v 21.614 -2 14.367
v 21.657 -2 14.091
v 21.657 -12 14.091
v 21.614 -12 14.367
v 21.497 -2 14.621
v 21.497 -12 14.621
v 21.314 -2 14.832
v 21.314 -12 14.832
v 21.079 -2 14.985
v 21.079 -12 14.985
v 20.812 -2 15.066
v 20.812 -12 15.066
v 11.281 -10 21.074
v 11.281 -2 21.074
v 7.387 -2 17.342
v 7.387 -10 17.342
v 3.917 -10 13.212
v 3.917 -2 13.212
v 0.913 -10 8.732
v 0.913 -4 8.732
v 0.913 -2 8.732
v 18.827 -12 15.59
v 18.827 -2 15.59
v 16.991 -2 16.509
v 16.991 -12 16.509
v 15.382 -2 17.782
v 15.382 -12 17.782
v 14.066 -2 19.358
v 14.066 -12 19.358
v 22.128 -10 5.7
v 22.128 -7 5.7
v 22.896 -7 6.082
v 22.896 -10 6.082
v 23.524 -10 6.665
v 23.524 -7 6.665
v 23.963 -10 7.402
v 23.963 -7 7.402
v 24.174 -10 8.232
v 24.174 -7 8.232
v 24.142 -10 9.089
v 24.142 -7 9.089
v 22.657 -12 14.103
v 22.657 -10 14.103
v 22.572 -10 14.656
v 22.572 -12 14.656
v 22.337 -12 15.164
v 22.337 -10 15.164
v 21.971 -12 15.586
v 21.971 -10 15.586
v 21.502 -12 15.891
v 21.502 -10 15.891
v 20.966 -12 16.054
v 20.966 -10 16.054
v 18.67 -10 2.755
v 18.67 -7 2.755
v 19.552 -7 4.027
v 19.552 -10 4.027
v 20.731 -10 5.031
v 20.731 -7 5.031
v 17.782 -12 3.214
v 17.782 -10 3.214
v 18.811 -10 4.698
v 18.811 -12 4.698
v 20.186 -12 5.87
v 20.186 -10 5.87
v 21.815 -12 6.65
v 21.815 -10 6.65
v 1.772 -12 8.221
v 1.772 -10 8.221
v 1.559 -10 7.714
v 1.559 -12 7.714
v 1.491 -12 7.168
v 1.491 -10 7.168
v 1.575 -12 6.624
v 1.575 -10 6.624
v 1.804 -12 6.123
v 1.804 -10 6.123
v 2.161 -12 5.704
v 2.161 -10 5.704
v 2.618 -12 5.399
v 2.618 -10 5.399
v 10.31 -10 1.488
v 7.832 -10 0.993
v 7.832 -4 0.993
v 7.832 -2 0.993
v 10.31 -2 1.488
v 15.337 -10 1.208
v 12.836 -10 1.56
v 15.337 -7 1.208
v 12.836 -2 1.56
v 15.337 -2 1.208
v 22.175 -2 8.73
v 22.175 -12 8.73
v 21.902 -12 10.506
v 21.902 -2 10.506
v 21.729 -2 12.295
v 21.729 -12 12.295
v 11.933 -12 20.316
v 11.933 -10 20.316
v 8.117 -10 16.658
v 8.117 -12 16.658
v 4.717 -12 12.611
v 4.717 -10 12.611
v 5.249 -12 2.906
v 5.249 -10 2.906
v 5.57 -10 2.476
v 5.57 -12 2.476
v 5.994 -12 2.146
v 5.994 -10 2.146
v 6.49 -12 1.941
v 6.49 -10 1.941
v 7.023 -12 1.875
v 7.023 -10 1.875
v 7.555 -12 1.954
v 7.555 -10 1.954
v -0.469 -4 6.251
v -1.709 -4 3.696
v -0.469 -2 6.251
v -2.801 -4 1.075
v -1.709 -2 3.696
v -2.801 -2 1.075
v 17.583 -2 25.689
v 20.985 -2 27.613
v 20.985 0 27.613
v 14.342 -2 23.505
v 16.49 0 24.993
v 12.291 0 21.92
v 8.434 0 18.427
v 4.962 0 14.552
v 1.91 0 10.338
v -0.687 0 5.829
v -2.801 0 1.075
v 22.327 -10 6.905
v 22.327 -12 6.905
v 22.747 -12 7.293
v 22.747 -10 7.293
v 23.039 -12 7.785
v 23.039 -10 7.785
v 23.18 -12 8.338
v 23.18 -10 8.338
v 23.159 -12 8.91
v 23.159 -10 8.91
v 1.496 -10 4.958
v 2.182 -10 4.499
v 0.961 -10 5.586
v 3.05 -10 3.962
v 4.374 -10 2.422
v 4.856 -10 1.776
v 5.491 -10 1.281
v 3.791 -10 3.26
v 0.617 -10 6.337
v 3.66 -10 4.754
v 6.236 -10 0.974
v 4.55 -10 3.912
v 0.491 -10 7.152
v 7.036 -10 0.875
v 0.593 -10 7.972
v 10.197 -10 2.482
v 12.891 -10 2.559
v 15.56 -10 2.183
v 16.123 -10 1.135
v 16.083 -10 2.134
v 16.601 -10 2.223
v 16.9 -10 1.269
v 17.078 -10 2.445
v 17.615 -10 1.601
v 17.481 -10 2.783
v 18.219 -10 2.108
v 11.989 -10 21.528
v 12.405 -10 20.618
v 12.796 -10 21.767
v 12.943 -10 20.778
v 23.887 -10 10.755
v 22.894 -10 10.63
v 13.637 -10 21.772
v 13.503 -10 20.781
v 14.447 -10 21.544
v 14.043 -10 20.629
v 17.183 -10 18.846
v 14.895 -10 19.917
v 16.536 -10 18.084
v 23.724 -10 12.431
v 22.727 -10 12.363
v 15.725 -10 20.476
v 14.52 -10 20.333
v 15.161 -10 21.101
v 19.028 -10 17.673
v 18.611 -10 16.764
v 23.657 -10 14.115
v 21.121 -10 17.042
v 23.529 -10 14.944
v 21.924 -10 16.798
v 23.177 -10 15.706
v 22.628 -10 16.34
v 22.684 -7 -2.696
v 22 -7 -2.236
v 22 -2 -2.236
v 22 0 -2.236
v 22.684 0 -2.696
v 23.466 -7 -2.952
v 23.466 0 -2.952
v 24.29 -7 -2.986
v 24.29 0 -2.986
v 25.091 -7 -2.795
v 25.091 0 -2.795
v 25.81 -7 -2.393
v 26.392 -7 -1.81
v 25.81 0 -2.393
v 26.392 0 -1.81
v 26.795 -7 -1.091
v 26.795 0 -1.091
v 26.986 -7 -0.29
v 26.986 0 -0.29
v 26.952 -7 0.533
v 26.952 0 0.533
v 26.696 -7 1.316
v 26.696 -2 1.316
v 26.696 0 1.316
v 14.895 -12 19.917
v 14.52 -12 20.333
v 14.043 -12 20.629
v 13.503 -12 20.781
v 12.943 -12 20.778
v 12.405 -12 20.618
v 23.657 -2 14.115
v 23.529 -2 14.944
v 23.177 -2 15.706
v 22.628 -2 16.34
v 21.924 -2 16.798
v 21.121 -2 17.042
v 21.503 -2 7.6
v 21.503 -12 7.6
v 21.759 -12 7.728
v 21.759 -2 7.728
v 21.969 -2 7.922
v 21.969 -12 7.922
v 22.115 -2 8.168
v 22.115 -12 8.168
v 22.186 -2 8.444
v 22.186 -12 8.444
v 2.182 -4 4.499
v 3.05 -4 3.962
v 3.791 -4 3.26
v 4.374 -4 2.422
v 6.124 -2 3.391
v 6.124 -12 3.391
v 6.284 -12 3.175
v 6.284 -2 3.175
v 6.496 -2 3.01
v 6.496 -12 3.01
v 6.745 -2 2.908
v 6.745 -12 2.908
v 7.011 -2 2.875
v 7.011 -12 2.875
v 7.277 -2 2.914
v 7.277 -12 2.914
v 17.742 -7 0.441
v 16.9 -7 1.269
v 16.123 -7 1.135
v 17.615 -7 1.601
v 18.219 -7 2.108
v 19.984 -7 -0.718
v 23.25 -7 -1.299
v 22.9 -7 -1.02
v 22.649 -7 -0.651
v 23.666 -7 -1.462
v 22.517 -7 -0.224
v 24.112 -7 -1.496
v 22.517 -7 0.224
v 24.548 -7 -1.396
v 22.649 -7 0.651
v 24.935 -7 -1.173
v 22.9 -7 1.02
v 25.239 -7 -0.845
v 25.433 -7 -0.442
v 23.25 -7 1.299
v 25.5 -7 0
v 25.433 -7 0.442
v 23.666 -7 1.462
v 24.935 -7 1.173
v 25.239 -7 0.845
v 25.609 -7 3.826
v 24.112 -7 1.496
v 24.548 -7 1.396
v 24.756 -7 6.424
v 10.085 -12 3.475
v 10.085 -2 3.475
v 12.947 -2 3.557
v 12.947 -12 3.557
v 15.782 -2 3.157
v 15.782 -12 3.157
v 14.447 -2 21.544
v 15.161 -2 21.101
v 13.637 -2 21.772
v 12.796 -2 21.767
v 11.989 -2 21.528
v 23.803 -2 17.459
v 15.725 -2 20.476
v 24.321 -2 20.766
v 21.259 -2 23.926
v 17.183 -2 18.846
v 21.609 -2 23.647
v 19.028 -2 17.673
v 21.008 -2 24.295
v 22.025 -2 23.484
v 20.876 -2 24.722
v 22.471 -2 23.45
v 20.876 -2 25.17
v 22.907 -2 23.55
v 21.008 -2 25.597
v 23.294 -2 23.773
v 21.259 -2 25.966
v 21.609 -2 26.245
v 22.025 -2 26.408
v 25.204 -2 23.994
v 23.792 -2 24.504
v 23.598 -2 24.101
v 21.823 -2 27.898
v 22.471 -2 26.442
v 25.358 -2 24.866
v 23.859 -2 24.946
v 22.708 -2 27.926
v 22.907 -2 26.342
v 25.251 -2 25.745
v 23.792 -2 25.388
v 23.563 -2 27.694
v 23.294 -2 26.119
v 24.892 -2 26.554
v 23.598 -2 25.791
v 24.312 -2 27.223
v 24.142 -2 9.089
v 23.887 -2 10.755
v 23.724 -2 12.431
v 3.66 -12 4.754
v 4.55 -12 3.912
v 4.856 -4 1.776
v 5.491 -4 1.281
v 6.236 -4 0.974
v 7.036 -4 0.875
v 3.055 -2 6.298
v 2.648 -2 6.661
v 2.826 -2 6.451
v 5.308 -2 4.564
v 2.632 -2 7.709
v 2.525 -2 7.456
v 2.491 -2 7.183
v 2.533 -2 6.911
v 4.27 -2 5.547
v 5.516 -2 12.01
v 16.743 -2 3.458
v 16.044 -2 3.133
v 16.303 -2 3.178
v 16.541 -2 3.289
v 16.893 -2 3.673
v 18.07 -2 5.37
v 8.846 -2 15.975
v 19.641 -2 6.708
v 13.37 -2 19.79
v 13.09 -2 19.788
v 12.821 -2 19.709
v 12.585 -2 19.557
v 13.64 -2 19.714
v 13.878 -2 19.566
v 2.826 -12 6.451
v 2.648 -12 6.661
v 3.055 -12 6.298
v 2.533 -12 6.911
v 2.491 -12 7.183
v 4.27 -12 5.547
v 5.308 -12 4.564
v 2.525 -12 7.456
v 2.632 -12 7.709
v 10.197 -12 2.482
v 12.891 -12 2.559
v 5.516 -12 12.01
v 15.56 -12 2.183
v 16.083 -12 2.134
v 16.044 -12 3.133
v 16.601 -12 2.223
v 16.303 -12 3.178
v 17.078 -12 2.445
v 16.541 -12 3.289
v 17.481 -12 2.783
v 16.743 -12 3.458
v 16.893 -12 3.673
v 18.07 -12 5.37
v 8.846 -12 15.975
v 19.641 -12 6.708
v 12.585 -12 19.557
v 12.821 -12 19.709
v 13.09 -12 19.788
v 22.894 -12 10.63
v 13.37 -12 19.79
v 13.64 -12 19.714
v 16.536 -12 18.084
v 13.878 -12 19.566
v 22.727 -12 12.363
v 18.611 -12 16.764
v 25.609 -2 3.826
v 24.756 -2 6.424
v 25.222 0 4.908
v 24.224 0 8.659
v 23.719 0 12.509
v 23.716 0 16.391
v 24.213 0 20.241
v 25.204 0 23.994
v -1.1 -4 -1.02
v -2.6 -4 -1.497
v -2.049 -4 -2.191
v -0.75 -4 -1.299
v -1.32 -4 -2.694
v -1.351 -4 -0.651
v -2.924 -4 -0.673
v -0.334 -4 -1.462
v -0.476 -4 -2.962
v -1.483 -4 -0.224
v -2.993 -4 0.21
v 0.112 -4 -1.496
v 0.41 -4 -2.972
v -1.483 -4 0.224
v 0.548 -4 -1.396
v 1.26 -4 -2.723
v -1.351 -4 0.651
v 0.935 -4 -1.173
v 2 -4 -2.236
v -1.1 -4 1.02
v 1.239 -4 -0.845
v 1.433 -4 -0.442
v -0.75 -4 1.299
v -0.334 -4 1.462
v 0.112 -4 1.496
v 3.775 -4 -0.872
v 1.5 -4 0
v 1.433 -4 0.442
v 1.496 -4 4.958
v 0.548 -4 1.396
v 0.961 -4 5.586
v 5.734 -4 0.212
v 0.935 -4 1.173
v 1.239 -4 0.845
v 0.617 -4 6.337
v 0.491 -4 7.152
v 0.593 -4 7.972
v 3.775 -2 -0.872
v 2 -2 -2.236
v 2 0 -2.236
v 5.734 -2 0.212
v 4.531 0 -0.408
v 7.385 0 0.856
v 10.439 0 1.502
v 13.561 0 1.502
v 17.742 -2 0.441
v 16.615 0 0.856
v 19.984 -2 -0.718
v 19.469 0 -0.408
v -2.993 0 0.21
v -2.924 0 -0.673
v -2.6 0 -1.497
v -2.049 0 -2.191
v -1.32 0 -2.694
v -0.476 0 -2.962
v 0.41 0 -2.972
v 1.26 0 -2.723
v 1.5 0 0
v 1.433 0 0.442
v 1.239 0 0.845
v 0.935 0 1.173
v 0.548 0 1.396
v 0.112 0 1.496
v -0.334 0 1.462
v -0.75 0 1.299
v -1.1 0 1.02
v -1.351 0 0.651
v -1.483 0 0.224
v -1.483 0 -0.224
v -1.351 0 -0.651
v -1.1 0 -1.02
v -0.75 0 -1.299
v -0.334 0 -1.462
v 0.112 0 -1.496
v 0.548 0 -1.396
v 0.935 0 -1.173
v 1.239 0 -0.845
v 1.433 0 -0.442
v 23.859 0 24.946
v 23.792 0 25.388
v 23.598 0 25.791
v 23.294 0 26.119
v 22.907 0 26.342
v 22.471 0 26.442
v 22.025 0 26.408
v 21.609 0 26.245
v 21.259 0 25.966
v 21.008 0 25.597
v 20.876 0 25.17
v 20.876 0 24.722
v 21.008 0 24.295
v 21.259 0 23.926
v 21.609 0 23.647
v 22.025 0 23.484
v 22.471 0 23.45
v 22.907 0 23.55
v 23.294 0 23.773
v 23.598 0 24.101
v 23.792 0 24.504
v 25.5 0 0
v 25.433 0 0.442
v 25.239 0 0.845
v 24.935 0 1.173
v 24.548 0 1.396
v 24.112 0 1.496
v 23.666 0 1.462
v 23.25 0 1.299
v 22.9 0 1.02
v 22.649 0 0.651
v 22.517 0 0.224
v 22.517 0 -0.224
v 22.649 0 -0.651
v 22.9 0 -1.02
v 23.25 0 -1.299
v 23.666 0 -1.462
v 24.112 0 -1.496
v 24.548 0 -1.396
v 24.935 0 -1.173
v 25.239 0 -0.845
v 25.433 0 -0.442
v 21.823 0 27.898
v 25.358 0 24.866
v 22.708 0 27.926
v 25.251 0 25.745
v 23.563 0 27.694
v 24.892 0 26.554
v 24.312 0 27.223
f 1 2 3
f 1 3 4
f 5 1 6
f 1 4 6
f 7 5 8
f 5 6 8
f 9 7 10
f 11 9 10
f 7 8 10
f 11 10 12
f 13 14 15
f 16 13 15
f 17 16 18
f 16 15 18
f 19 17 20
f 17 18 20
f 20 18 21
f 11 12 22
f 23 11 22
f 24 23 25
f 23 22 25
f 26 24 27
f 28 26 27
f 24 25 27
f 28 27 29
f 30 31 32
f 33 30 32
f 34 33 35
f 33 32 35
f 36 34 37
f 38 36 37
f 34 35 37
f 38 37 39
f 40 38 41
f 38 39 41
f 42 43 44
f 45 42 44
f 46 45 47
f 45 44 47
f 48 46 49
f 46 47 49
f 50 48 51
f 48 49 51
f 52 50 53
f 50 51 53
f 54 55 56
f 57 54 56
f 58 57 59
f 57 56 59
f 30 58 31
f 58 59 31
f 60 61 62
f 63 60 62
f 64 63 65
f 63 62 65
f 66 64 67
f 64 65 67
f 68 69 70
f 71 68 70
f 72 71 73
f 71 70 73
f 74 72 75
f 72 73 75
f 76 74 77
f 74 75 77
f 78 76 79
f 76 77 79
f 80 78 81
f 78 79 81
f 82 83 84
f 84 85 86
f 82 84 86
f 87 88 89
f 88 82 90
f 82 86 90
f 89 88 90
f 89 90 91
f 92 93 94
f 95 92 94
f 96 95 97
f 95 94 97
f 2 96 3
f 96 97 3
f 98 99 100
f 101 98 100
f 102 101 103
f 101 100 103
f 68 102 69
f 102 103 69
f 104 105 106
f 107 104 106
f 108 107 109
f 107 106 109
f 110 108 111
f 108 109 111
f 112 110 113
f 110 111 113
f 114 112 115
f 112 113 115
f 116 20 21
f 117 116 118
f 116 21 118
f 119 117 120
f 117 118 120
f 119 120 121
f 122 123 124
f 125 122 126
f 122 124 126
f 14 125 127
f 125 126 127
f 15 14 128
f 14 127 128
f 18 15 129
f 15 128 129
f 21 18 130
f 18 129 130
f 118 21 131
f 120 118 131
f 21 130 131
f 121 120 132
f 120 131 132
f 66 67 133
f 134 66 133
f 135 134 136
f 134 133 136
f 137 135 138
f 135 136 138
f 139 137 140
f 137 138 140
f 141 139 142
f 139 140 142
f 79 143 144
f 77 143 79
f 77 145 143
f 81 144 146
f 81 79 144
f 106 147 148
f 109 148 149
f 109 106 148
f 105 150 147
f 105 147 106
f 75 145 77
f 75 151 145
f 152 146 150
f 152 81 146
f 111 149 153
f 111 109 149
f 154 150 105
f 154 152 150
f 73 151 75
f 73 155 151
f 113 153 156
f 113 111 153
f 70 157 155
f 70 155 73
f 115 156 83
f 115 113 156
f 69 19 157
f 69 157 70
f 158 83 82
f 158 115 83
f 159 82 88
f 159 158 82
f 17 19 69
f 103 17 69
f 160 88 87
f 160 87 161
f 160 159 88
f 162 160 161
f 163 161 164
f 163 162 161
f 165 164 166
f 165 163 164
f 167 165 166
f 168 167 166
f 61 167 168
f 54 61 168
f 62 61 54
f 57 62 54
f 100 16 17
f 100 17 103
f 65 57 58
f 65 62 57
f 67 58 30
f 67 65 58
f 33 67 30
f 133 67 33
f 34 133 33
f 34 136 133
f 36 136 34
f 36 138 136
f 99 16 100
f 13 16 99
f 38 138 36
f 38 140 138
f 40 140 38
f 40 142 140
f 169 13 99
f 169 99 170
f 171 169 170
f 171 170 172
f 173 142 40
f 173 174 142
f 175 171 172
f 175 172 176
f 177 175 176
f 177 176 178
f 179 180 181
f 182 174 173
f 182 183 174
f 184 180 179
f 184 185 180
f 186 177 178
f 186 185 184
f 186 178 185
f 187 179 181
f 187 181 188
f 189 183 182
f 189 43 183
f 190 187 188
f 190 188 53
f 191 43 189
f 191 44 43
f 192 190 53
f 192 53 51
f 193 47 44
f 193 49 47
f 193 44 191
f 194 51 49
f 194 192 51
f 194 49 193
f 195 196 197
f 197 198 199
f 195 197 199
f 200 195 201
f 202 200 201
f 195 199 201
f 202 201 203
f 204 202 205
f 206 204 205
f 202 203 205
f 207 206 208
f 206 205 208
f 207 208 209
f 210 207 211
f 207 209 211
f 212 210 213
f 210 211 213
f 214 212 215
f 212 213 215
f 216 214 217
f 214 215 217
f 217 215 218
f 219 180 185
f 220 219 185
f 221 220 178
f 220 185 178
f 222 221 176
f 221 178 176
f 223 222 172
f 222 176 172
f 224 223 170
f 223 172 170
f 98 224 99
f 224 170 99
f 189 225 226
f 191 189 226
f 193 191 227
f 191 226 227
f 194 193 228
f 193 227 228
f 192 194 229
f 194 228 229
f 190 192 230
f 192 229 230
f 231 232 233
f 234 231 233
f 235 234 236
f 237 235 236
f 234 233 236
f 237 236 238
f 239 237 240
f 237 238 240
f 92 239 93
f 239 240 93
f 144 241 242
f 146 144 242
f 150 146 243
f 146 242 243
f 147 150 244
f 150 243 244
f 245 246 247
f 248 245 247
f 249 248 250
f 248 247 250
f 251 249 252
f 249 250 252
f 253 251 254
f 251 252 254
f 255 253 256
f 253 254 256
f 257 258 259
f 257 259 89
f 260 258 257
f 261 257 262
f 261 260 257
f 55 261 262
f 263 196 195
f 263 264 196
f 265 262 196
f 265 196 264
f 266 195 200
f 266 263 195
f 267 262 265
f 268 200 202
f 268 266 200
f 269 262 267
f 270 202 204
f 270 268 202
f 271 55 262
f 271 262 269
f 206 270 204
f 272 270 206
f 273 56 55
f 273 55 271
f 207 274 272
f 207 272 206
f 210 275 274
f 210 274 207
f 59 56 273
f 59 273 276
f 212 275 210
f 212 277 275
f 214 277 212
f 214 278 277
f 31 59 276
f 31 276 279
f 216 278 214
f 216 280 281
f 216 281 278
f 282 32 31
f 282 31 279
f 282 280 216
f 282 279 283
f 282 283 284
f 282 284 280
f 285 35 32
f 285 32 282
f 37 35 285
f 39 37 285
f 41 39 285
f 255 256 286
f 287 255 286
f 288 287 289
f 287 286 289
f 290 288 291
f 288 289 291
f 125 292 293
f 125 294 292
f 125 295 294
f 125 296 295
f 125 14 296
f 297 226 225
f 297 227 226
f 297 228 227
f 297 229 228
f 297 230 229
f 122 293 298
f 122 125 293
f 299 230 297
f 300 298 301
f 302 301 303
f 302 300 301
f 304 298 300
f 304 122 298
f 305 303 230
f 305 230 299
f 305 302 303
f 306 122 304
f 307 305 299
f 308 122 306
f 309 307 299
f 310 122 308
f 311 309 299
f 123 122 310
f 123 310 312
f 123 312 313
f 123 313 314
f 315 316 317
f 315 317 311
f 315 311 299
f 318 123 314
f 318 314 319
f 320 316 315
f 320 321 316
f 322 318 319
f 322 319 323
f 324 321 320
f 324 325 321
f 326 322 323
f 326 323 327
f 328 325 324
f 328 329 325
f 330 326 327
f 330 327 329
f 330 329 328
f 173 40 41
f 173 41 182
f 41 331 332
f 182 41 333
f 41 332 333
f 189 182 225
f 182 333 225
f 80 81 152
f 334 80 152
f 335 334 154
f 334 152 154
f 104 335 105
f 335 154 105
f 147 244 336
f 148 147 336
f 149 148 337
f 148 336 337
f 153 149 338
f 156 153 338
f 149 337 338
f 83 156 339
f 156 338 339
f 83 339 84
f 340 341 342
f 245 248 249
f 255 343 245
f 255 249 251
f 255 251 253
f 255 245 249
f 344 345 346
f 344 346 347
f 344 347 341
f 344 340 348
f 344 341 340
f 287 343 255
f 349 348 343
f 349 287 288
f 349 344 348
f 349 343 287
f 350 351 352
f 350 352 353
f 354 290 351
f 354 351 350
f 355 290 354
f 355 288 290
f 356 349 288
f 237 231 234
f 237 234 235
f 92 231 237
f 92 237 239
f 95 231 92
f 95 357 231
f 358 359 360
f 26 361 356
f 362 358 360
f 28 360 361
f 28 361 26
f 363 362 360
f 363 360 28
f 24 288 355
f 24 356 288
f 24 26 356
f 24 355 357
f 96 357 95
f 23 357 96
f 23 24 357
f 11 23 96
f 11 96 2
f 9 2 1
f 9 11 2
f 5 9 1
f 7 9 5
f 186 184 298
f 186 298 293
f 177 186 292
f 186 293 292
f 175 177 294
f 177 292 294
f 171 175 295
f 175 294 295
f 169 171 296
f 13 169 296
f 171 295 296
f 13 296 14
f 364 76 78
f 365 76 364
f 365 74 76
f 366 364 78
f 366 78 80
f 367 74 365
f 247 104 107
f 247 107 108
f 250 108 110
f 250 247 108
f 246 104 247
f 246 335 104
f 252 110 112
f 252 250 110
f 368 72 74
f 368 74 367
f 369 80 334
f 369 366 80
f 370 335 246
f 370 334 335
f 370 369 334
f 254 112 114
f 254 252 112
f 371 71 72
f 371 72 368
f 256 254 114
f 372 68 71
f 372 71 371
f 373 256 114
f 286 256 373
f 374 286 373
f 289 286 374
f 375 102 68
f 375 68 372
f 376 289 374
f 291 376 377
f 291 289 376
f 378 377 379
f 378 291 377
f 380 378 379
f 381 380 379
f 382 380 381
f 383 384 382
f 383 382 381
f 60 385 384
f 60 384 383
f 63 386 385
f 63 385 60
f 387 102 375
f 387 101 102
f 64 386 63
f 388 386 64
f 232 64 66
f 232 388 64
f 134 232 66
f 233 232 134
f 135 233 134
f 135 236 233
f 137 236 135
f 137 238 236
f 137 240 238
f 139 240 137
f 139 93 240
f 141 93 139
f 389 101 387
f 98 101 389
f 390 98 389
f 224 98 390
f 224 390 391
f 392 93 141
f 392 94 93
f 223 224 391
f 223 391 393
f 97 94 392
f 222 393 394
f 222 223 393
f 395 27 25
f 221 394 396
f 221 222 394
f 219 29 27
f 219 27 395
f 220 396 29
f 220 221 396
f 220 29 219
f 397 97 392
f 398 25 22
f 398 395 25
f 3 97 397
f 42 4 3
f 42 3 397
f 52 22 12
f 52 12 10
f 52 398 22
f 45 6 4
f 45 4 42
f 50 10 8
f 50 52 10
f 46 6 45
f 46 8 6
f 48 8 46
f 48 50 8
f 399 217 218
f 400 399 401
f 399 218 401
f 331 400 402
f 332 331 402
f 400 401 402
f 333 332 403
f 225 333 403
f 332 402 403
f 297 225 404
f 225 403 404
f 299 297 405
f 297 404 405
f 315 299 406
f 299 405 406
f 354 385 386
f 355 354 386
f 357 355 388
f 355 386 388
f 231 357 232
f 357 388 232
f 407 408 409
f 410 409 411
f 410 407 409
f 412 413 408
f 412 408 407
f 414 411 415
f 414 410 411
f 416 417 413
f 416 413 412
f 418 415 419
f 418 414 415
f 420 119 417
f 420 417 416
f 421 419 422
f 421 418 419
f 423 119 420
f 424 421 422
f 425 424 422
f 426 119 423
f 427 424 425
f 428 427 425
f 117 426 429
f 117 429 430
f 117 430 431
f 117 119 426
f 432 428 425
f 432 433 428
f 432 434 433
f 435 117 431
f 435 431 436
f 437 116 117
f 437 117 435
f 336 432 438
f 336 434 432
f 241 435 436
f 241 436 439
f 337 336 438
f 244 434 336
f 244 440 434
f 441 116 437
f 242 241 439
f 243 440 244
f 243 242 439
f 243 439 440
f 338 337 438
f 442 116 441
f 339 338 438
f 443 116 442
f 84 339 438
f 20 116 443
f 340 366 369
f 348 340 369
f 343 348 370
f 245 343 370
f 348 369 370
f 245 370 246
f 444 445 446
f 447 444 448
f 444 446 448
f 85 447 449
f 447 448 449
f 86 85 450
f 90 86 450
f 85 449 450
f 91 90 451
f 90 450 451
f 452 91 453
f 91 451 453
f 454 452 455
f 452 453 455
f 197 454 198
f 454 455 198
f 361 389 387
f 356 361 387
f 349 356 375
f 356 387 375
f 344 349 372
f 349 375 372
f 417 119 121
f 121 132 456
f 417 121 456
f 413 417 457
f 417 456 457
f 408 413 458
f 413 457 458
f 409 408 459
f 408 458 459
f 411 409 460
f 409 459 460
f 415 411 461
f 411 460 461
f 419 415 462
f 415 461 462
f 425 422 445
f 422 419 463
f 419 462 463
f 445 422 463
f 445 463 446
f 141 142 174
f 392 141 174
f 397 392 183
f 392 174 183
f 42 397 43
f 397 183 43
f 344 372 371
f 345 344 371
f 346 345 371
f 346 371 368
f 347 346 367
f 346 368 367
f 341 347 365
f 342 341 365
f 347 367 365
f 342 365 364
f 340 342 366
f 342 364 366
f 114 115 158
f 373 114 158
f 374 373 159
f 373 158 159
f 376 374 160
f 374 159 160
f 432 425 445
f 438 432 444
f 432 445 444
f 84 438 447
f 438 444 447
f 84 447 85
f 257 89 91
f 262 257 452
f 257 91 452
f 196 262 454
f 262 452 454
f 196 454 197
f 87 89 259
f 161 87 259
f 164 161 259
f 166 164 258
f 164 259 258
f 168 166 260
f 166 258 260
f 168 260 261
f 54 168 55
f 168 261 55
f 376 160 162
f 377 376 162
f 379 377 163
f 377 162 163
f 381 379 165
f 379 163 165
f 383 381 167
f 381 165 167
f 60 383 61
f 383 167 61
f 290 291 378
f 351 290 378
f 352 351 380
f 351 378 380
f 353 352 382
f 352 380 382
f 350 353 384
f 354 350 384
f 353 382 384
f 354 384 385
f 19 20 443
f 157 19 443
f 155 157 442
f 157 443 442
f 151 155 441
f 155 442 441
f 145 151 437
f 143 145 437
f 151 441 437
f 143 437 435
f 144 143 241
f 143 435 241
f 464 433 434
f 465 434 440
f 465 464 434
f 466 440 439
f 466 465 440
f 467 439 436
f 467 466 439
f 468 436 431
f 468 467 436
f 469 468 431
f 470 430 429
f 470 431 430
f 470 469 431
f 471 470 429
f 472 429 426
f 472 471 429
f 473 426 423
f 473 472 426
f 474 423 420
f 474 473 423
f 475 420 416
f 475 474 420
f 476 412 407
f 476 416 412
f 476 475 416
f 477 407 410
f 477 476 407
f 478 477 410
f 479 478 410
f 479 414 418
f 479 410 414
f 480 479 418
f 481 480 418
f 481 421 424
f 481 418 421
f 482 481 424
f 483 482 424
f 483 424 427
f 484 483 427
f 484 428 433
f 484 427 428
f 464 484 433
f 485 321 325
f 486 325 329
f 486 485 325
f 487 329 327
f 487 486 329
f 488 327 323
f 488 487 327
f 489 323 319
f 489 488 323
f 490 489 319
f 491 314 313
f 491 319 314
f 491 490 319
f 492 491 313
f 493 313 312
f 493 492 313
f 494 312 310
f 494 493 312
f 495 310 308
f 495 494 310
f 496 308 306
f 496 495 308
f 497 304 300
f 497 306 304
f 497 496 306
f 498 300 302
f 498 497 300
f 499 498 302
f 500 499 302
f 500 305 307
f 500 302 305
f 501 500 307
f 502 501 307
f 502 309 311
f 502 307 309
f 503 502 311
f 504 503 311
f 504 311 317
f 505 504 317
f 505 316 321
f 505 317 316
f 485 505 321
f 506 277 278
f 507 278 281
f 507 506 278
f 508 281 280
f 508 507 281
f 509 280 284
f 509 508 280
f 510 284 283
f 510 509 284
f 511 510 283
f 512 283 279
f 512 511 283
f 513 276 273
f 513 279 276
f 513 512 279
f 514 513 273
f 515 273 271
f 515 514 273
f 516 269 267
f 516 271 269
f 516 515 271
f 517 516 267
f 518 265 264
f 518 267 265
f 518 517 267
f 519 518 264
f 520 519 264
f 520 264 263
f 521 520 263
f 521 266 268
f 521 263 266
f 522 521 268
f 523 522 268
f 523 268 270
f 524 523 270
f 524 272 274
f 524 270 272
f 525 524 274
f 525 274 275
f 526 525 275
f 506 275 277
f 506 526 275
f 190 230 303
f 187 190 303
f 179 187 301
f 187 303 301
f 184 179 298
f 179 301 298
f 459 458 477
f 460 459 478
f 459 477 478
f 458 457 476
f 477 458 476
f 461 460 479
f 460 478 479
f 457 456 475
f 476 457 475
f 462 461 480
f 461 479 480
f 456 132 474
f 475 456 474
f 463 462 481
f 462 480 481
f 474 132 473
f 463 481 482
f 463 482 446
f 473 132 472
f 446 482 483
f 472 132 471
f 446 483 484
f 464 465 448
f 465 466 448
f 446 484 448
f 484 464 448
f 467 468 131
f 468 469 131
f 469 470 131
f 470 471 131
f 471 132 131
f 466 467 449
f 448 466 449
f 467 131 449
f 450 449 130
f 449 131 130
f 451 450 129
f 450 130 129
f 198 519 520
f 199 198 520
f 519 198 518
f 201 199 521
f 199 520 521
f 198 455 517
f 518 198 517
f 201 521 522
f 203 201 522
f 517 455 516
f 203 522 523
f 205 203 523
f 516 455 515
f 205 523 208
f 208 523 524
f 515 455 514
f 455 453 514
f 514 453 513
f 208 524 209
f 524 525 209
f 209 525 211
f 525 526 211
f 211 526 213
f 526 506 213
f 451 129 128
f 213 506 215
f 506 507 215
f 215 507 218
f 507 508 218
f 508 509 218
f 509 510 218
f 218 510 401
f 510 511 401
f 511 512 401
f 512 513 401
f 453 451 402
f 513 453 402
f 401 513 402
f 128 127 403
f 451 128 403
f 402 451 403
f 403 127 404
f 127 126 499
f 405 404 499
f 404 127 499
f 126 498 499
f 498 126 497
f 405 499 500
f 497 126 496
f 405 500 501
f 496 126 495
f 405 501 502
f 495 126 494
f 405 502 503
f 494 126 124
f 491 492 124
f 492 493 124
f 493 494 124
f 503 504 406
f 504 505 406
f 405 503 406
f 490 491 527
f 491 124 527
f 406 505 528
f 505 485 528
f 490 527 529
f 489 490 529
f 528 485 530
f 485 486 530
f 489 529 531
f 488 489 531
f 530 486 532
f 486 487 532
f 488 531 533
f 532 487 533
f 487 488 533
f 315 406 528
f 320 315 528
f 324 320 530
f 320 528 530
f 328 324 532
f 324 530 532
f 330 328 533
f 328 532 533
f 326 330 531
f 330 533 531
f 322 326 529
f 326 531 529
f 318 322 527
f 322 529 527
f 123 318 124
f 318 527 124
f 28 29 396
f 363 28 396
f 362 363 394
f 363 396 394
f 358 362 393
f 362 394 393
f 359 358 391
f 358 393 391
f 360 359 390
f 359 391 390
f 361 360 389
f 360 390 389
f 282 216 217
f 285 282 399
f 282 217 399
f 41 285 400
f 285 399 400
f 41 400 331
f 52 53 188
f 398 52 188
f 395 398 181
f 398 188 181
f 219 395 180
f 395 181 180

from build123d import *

# Parameters (mm, degrees)
F1_DEPTH  = 2
F3_DEPTH  = 8
F5_DEPTH  = 2
F7_DEPTH  = 5
F9_DEPTH  = 2
F11_DEPTH = 10
F12_R     = 1.5
F13_DEPTH = 12.001


with BuildPart() as f1:
    # F0 (on Front) → F1 (new body)
    with BuildSketch(Plane.XZ):
        with BuildLine():
            ThreePointArc((20.9852738604, 27.6129976553), (6.6475053794, 16.5350086475), (-2.8008963523, 1.074699783))
            ThreePointArc((-2.8008963523, 1.074699783), (-1.7031308032, -2.4696852972), (2, -2.2360679775))
            ThreePointArc((2, -2.2360679775), (12, 1.583592135), (22, -2.2360679775))
            ThreePointArc((22, -2.2360679775), (25.8098712045, -2.3925647793), (26.6958733889, 1.3161560208))
            ThreePointArc((26.6958733889, 1.3161560208), (23.7193066232, 12.5085096075), (25.2040552071, 23.994337839))
            ThreePointArc((25.2040552071, 23.994337839), (24.3121710173, 27.2230865107), (20.9852738604, 27.6129976553))
        make_face()
    extrude(amount=F1_DEPTH)

    # F2 (on face) → F3 (join)
    with BuildSketch(Plane.XZ.offset(2)):
        with BuildLine():
            ThreePointArc((2.1819579837, 4.4987842088), (3.4387063042, 3.6297794635), (4.3743364575, 2.4218134851))
            ThreePointArc((4.3743364575, 2.4218134851), (5.8533522977, 1.1022435306), (7.83244861, 0.9930166694))
            ThreePointArc((7.83244861, 0.9930166694), (11.5712509604, 1.5774633583), (15.3373412263, 1.2076187193))
            ThreePointArc((15.3373412263, 1.2076187193), (17.2681996472, 1.4114232526), (18.6698729811, 2.7549493575))
            ThreePointArc((18.6698729811, 2.7549493575), (20.1092125836, 4.5674690235), (22.1275149749, 5.7003333087))
            ThreePointArc((22.1275149749, 5.7003333087), (23.7699182337, 7.0173378758), (24.1424847183, 9.0893378054))
            ThreePointArc((24.1424847183, 9.0893378054), (23.7937370176, 11.591814757), (23.6568029492, 14.1147624204))
            ThreePointArc((23.6568029492, 14.1147624204), (22.9247140991, 16.0425380377), (21.1211981937, 17.0423396652))
            ThreePointArc((21.1211981937, 17.0423396652), (18.064820066, 18.1961838029), (15.724550358, 20.475644539))
            ThreePointArc((15.724550358, 20.475644539), (13.6368998786, 21.7724389046), (11.2806267778, 21.0739138692))
            ThreePointArc((11.2806267778, 21.0739138692), (5.5962553568, 15.3235804079), (0.9130746838, 8.7322048192))
            ThreePointArc((0.9130746838, 8.7322048192), (0.6174404831, 6.3367228484), (2.1819579837, 4.4987842088))
        make_face()
    extrude(amount=F3_DEPTH)

    # F4 (on face) → F5 (join)
    with BuildSketch(Plane.XZ.offset(2)):
        with BuildLine():
            ThreePointArc((2, -2.2360679775), (4.7345595446, -0.2933984926), (7.83244861, 0.9930166694))
            ThreePointArc((7.83244861, 0.9930166694), (5.8533522977, 1.1022435306), (4.3743364575, 2.4218134851))
            ThreePointArc((4.3743364575, 2.4218134851), (3.4387063042, 3.6297794635), (2.1819579837, 4.4987842088))
            ThreePointArc((2.1819579837, 4.4987842088), (0.6174404831, 6.3367228484), (0.9130746838, 8.7322048192))
            ThreePointArc((0.9130746838, 8.7322048192), (-1.1071325681, 4.9826165706), (-2.8008963523, 1.074699783))
            ThreePointArc((-2.8008963523, 1.074699783), (-1.7031308032, -2.4696852972), (2, -2.2360679775))
        make_face()
    extrude(amount=F5_DEPTH)

    # F6 (on face) → F7 (join)
    with BuildSketch(Plane.XZ.offset(2)):
        with BuildLine():
            ThreePointArc((26.6958733889, 1.3161560208), (25.1529407341, 5.1152911032), (24.1424847183, 9.0893378054))
            ThreePointArc((24.1424847183, 9.0893378054), (23.7699182337, 7.0173378758), (22.1275149749, 5.7003333087))
            ThreePointArc((22.1275149749, 5.7003333087), (20.1092125836, 4.5674690235), (18.6698729811, 2.7549493575))
            ThreePointArc((18.6698729811, 2.7549493575), (17.2681996472, 1.4114232526), (15.3373412263, 1.2076187193))
            ThreePointArc((15.3373412263, 1.2076187193), (18.8873733936, -0.0910903177), (22, -2.2360679775))
            ThreePointArc((22, -2.2360679775), (25.8098712045, -2.3925647793), (26.6958733889, 1.3161560208))
        make_face()
    extrude(amount=F7_DEPTH)

    # F8 (on face) → F9 (join)
    with BuildSketch(Plane.XZ.offset(10)):
        with BuildLine():
            ThreePointArc((17.7815184779, 3.2141075837), (19.4607480142, 5.3287138608), (21.8154341374, 6.6503888602))
            ThreePointArc((21.8154341374, 6.6503888602), (22.9103696432, 7.5283919049), (23.1587472996, 8.9097251913))
            ThreePointArc((23.1587472996, 8.9097251913), (22.7983746756, 11.4956180412), (22.6568761383, 14.1026639602))
            ThreePointArc((22.6568761383, 14.1026639602), (22.1688169049, 15.387847705), (20.966472968, 16.0543821233))
            ThreePointArc((20.966472968, 16.0543821233), (17.5280475743, 17.3524567782), (14.8952441528, 19.9168501063))
            ThreePointArc((14.8952441528, 19.9168501063), (13.5034771665, 20.7813796834), (11.9326284326, 20.3156963265))
            ThreePointArc((11.9326284326, 20.3156963265), (6.3619444401, 14.6803695344), (1.7724273805, 8.2208214575))
            ThreePointArc((1.7724273805, 8.2208214575), (1.5753379134, 6.623833477), (2.6183495805, 5.3985410505))
            ThreePointArc((2.6183495805, 5.3985410505), (4.1264475651, 4.3557353562), (5.249203749, 2.9061761822))
            ThreePointArc((5.249203749, 2.9061761822), (6.2352143091, 2.0264628791), (7.5546118506, 1.9536449717))
            ThreePointArc((7.5546118506, 1.9536449717), (11.5426676911, 2.5770547732), (15.5598306414, 2.1825538249))
            ThreePointArc((15.5598306414, 2.1825538249), (16.8470695887, 2.3184235138), (17.7815184779, 3.2141075837))
        make_face()
    extrude(amount=F9_DEPTH)

    # F10 (on face) → F11 (cut)
    with BuildSketch(Plane.XZ.offset(12)):
        with BuildLine():
            ThreePointArc((14.0659379899, 19.3580557023), (13.3700544612, 19.7903205129), (12.5846300541, 19.5574788225))
            ThreePointArc((12.5846300541, 19.5574788225), (7.1276334842, 14.0371586938), (2.6317800333, 7.7094381219))
            ThreePointArc((2.6317800333, 7.7094381219), (2.5332352947, 6.9109440908), (3.0547411549, 6.2982978463))
            ThreePointArc((3.0547411549, 6.2982978463), (4.8141887907, 5.0816912117), (6.1240709957, 3.3905388544))
            ThreePointArc((6.1240709957, 3.3905388544), (6.617076301, 2.9506821804), (7.2767751055, 2.9142732248))
            ThreePointArc((7.2767751055, 2.9142732248), (11.5140844233, 3.576646137), (15.7823200452, 3.1574888807))
            ThreePointArc((15.7823200452, 3.1574888807), (16.4259395517, 3.2254237286), (16.8931640202, 3.6732657865))
            ThreePointArc((16.8931640202, 3.6732657865), (18.812283478, 6.0899586591), (21.5033533158, 7.6004443631))
            ThreePointArc((21.5033533158, 7.6004443631), (22.0508210967, 8.0394459079), (22.1750099313, 8.7301125864))
            ThreePointArc((22.1750099313, 8.7301125864), (21.8030123845, 11.3994213304), (21.6569493785, 14.0905655005))
            ThreePointArc((21.6569493785, 14.0905655005), (21.4129197493, 14.7331574058), (20.8117477501, 15.066424632))
            ThreePointArc((20.8117477501, 15.066424632), (16.99127511, 16.5087297967), (14.0659379899, 19.3580557023))
        make_face()
    extrude(amount=-F11_DEPTH, mode=Mode.SUBTRACT)

    # F12 (on Front) → F13 (cut, through all)
    with BuildSketch(Plane.XZ):
        Circle(F12_R)
        with Locations((22.359, 24.946)):
            Circle(F12_R)
        with Locations((24, 0)):
            Circle(F12_R)
    extrude(amount=F13_DEPTH, mode=Mode.SUBTRACT)


solid = f1.part
